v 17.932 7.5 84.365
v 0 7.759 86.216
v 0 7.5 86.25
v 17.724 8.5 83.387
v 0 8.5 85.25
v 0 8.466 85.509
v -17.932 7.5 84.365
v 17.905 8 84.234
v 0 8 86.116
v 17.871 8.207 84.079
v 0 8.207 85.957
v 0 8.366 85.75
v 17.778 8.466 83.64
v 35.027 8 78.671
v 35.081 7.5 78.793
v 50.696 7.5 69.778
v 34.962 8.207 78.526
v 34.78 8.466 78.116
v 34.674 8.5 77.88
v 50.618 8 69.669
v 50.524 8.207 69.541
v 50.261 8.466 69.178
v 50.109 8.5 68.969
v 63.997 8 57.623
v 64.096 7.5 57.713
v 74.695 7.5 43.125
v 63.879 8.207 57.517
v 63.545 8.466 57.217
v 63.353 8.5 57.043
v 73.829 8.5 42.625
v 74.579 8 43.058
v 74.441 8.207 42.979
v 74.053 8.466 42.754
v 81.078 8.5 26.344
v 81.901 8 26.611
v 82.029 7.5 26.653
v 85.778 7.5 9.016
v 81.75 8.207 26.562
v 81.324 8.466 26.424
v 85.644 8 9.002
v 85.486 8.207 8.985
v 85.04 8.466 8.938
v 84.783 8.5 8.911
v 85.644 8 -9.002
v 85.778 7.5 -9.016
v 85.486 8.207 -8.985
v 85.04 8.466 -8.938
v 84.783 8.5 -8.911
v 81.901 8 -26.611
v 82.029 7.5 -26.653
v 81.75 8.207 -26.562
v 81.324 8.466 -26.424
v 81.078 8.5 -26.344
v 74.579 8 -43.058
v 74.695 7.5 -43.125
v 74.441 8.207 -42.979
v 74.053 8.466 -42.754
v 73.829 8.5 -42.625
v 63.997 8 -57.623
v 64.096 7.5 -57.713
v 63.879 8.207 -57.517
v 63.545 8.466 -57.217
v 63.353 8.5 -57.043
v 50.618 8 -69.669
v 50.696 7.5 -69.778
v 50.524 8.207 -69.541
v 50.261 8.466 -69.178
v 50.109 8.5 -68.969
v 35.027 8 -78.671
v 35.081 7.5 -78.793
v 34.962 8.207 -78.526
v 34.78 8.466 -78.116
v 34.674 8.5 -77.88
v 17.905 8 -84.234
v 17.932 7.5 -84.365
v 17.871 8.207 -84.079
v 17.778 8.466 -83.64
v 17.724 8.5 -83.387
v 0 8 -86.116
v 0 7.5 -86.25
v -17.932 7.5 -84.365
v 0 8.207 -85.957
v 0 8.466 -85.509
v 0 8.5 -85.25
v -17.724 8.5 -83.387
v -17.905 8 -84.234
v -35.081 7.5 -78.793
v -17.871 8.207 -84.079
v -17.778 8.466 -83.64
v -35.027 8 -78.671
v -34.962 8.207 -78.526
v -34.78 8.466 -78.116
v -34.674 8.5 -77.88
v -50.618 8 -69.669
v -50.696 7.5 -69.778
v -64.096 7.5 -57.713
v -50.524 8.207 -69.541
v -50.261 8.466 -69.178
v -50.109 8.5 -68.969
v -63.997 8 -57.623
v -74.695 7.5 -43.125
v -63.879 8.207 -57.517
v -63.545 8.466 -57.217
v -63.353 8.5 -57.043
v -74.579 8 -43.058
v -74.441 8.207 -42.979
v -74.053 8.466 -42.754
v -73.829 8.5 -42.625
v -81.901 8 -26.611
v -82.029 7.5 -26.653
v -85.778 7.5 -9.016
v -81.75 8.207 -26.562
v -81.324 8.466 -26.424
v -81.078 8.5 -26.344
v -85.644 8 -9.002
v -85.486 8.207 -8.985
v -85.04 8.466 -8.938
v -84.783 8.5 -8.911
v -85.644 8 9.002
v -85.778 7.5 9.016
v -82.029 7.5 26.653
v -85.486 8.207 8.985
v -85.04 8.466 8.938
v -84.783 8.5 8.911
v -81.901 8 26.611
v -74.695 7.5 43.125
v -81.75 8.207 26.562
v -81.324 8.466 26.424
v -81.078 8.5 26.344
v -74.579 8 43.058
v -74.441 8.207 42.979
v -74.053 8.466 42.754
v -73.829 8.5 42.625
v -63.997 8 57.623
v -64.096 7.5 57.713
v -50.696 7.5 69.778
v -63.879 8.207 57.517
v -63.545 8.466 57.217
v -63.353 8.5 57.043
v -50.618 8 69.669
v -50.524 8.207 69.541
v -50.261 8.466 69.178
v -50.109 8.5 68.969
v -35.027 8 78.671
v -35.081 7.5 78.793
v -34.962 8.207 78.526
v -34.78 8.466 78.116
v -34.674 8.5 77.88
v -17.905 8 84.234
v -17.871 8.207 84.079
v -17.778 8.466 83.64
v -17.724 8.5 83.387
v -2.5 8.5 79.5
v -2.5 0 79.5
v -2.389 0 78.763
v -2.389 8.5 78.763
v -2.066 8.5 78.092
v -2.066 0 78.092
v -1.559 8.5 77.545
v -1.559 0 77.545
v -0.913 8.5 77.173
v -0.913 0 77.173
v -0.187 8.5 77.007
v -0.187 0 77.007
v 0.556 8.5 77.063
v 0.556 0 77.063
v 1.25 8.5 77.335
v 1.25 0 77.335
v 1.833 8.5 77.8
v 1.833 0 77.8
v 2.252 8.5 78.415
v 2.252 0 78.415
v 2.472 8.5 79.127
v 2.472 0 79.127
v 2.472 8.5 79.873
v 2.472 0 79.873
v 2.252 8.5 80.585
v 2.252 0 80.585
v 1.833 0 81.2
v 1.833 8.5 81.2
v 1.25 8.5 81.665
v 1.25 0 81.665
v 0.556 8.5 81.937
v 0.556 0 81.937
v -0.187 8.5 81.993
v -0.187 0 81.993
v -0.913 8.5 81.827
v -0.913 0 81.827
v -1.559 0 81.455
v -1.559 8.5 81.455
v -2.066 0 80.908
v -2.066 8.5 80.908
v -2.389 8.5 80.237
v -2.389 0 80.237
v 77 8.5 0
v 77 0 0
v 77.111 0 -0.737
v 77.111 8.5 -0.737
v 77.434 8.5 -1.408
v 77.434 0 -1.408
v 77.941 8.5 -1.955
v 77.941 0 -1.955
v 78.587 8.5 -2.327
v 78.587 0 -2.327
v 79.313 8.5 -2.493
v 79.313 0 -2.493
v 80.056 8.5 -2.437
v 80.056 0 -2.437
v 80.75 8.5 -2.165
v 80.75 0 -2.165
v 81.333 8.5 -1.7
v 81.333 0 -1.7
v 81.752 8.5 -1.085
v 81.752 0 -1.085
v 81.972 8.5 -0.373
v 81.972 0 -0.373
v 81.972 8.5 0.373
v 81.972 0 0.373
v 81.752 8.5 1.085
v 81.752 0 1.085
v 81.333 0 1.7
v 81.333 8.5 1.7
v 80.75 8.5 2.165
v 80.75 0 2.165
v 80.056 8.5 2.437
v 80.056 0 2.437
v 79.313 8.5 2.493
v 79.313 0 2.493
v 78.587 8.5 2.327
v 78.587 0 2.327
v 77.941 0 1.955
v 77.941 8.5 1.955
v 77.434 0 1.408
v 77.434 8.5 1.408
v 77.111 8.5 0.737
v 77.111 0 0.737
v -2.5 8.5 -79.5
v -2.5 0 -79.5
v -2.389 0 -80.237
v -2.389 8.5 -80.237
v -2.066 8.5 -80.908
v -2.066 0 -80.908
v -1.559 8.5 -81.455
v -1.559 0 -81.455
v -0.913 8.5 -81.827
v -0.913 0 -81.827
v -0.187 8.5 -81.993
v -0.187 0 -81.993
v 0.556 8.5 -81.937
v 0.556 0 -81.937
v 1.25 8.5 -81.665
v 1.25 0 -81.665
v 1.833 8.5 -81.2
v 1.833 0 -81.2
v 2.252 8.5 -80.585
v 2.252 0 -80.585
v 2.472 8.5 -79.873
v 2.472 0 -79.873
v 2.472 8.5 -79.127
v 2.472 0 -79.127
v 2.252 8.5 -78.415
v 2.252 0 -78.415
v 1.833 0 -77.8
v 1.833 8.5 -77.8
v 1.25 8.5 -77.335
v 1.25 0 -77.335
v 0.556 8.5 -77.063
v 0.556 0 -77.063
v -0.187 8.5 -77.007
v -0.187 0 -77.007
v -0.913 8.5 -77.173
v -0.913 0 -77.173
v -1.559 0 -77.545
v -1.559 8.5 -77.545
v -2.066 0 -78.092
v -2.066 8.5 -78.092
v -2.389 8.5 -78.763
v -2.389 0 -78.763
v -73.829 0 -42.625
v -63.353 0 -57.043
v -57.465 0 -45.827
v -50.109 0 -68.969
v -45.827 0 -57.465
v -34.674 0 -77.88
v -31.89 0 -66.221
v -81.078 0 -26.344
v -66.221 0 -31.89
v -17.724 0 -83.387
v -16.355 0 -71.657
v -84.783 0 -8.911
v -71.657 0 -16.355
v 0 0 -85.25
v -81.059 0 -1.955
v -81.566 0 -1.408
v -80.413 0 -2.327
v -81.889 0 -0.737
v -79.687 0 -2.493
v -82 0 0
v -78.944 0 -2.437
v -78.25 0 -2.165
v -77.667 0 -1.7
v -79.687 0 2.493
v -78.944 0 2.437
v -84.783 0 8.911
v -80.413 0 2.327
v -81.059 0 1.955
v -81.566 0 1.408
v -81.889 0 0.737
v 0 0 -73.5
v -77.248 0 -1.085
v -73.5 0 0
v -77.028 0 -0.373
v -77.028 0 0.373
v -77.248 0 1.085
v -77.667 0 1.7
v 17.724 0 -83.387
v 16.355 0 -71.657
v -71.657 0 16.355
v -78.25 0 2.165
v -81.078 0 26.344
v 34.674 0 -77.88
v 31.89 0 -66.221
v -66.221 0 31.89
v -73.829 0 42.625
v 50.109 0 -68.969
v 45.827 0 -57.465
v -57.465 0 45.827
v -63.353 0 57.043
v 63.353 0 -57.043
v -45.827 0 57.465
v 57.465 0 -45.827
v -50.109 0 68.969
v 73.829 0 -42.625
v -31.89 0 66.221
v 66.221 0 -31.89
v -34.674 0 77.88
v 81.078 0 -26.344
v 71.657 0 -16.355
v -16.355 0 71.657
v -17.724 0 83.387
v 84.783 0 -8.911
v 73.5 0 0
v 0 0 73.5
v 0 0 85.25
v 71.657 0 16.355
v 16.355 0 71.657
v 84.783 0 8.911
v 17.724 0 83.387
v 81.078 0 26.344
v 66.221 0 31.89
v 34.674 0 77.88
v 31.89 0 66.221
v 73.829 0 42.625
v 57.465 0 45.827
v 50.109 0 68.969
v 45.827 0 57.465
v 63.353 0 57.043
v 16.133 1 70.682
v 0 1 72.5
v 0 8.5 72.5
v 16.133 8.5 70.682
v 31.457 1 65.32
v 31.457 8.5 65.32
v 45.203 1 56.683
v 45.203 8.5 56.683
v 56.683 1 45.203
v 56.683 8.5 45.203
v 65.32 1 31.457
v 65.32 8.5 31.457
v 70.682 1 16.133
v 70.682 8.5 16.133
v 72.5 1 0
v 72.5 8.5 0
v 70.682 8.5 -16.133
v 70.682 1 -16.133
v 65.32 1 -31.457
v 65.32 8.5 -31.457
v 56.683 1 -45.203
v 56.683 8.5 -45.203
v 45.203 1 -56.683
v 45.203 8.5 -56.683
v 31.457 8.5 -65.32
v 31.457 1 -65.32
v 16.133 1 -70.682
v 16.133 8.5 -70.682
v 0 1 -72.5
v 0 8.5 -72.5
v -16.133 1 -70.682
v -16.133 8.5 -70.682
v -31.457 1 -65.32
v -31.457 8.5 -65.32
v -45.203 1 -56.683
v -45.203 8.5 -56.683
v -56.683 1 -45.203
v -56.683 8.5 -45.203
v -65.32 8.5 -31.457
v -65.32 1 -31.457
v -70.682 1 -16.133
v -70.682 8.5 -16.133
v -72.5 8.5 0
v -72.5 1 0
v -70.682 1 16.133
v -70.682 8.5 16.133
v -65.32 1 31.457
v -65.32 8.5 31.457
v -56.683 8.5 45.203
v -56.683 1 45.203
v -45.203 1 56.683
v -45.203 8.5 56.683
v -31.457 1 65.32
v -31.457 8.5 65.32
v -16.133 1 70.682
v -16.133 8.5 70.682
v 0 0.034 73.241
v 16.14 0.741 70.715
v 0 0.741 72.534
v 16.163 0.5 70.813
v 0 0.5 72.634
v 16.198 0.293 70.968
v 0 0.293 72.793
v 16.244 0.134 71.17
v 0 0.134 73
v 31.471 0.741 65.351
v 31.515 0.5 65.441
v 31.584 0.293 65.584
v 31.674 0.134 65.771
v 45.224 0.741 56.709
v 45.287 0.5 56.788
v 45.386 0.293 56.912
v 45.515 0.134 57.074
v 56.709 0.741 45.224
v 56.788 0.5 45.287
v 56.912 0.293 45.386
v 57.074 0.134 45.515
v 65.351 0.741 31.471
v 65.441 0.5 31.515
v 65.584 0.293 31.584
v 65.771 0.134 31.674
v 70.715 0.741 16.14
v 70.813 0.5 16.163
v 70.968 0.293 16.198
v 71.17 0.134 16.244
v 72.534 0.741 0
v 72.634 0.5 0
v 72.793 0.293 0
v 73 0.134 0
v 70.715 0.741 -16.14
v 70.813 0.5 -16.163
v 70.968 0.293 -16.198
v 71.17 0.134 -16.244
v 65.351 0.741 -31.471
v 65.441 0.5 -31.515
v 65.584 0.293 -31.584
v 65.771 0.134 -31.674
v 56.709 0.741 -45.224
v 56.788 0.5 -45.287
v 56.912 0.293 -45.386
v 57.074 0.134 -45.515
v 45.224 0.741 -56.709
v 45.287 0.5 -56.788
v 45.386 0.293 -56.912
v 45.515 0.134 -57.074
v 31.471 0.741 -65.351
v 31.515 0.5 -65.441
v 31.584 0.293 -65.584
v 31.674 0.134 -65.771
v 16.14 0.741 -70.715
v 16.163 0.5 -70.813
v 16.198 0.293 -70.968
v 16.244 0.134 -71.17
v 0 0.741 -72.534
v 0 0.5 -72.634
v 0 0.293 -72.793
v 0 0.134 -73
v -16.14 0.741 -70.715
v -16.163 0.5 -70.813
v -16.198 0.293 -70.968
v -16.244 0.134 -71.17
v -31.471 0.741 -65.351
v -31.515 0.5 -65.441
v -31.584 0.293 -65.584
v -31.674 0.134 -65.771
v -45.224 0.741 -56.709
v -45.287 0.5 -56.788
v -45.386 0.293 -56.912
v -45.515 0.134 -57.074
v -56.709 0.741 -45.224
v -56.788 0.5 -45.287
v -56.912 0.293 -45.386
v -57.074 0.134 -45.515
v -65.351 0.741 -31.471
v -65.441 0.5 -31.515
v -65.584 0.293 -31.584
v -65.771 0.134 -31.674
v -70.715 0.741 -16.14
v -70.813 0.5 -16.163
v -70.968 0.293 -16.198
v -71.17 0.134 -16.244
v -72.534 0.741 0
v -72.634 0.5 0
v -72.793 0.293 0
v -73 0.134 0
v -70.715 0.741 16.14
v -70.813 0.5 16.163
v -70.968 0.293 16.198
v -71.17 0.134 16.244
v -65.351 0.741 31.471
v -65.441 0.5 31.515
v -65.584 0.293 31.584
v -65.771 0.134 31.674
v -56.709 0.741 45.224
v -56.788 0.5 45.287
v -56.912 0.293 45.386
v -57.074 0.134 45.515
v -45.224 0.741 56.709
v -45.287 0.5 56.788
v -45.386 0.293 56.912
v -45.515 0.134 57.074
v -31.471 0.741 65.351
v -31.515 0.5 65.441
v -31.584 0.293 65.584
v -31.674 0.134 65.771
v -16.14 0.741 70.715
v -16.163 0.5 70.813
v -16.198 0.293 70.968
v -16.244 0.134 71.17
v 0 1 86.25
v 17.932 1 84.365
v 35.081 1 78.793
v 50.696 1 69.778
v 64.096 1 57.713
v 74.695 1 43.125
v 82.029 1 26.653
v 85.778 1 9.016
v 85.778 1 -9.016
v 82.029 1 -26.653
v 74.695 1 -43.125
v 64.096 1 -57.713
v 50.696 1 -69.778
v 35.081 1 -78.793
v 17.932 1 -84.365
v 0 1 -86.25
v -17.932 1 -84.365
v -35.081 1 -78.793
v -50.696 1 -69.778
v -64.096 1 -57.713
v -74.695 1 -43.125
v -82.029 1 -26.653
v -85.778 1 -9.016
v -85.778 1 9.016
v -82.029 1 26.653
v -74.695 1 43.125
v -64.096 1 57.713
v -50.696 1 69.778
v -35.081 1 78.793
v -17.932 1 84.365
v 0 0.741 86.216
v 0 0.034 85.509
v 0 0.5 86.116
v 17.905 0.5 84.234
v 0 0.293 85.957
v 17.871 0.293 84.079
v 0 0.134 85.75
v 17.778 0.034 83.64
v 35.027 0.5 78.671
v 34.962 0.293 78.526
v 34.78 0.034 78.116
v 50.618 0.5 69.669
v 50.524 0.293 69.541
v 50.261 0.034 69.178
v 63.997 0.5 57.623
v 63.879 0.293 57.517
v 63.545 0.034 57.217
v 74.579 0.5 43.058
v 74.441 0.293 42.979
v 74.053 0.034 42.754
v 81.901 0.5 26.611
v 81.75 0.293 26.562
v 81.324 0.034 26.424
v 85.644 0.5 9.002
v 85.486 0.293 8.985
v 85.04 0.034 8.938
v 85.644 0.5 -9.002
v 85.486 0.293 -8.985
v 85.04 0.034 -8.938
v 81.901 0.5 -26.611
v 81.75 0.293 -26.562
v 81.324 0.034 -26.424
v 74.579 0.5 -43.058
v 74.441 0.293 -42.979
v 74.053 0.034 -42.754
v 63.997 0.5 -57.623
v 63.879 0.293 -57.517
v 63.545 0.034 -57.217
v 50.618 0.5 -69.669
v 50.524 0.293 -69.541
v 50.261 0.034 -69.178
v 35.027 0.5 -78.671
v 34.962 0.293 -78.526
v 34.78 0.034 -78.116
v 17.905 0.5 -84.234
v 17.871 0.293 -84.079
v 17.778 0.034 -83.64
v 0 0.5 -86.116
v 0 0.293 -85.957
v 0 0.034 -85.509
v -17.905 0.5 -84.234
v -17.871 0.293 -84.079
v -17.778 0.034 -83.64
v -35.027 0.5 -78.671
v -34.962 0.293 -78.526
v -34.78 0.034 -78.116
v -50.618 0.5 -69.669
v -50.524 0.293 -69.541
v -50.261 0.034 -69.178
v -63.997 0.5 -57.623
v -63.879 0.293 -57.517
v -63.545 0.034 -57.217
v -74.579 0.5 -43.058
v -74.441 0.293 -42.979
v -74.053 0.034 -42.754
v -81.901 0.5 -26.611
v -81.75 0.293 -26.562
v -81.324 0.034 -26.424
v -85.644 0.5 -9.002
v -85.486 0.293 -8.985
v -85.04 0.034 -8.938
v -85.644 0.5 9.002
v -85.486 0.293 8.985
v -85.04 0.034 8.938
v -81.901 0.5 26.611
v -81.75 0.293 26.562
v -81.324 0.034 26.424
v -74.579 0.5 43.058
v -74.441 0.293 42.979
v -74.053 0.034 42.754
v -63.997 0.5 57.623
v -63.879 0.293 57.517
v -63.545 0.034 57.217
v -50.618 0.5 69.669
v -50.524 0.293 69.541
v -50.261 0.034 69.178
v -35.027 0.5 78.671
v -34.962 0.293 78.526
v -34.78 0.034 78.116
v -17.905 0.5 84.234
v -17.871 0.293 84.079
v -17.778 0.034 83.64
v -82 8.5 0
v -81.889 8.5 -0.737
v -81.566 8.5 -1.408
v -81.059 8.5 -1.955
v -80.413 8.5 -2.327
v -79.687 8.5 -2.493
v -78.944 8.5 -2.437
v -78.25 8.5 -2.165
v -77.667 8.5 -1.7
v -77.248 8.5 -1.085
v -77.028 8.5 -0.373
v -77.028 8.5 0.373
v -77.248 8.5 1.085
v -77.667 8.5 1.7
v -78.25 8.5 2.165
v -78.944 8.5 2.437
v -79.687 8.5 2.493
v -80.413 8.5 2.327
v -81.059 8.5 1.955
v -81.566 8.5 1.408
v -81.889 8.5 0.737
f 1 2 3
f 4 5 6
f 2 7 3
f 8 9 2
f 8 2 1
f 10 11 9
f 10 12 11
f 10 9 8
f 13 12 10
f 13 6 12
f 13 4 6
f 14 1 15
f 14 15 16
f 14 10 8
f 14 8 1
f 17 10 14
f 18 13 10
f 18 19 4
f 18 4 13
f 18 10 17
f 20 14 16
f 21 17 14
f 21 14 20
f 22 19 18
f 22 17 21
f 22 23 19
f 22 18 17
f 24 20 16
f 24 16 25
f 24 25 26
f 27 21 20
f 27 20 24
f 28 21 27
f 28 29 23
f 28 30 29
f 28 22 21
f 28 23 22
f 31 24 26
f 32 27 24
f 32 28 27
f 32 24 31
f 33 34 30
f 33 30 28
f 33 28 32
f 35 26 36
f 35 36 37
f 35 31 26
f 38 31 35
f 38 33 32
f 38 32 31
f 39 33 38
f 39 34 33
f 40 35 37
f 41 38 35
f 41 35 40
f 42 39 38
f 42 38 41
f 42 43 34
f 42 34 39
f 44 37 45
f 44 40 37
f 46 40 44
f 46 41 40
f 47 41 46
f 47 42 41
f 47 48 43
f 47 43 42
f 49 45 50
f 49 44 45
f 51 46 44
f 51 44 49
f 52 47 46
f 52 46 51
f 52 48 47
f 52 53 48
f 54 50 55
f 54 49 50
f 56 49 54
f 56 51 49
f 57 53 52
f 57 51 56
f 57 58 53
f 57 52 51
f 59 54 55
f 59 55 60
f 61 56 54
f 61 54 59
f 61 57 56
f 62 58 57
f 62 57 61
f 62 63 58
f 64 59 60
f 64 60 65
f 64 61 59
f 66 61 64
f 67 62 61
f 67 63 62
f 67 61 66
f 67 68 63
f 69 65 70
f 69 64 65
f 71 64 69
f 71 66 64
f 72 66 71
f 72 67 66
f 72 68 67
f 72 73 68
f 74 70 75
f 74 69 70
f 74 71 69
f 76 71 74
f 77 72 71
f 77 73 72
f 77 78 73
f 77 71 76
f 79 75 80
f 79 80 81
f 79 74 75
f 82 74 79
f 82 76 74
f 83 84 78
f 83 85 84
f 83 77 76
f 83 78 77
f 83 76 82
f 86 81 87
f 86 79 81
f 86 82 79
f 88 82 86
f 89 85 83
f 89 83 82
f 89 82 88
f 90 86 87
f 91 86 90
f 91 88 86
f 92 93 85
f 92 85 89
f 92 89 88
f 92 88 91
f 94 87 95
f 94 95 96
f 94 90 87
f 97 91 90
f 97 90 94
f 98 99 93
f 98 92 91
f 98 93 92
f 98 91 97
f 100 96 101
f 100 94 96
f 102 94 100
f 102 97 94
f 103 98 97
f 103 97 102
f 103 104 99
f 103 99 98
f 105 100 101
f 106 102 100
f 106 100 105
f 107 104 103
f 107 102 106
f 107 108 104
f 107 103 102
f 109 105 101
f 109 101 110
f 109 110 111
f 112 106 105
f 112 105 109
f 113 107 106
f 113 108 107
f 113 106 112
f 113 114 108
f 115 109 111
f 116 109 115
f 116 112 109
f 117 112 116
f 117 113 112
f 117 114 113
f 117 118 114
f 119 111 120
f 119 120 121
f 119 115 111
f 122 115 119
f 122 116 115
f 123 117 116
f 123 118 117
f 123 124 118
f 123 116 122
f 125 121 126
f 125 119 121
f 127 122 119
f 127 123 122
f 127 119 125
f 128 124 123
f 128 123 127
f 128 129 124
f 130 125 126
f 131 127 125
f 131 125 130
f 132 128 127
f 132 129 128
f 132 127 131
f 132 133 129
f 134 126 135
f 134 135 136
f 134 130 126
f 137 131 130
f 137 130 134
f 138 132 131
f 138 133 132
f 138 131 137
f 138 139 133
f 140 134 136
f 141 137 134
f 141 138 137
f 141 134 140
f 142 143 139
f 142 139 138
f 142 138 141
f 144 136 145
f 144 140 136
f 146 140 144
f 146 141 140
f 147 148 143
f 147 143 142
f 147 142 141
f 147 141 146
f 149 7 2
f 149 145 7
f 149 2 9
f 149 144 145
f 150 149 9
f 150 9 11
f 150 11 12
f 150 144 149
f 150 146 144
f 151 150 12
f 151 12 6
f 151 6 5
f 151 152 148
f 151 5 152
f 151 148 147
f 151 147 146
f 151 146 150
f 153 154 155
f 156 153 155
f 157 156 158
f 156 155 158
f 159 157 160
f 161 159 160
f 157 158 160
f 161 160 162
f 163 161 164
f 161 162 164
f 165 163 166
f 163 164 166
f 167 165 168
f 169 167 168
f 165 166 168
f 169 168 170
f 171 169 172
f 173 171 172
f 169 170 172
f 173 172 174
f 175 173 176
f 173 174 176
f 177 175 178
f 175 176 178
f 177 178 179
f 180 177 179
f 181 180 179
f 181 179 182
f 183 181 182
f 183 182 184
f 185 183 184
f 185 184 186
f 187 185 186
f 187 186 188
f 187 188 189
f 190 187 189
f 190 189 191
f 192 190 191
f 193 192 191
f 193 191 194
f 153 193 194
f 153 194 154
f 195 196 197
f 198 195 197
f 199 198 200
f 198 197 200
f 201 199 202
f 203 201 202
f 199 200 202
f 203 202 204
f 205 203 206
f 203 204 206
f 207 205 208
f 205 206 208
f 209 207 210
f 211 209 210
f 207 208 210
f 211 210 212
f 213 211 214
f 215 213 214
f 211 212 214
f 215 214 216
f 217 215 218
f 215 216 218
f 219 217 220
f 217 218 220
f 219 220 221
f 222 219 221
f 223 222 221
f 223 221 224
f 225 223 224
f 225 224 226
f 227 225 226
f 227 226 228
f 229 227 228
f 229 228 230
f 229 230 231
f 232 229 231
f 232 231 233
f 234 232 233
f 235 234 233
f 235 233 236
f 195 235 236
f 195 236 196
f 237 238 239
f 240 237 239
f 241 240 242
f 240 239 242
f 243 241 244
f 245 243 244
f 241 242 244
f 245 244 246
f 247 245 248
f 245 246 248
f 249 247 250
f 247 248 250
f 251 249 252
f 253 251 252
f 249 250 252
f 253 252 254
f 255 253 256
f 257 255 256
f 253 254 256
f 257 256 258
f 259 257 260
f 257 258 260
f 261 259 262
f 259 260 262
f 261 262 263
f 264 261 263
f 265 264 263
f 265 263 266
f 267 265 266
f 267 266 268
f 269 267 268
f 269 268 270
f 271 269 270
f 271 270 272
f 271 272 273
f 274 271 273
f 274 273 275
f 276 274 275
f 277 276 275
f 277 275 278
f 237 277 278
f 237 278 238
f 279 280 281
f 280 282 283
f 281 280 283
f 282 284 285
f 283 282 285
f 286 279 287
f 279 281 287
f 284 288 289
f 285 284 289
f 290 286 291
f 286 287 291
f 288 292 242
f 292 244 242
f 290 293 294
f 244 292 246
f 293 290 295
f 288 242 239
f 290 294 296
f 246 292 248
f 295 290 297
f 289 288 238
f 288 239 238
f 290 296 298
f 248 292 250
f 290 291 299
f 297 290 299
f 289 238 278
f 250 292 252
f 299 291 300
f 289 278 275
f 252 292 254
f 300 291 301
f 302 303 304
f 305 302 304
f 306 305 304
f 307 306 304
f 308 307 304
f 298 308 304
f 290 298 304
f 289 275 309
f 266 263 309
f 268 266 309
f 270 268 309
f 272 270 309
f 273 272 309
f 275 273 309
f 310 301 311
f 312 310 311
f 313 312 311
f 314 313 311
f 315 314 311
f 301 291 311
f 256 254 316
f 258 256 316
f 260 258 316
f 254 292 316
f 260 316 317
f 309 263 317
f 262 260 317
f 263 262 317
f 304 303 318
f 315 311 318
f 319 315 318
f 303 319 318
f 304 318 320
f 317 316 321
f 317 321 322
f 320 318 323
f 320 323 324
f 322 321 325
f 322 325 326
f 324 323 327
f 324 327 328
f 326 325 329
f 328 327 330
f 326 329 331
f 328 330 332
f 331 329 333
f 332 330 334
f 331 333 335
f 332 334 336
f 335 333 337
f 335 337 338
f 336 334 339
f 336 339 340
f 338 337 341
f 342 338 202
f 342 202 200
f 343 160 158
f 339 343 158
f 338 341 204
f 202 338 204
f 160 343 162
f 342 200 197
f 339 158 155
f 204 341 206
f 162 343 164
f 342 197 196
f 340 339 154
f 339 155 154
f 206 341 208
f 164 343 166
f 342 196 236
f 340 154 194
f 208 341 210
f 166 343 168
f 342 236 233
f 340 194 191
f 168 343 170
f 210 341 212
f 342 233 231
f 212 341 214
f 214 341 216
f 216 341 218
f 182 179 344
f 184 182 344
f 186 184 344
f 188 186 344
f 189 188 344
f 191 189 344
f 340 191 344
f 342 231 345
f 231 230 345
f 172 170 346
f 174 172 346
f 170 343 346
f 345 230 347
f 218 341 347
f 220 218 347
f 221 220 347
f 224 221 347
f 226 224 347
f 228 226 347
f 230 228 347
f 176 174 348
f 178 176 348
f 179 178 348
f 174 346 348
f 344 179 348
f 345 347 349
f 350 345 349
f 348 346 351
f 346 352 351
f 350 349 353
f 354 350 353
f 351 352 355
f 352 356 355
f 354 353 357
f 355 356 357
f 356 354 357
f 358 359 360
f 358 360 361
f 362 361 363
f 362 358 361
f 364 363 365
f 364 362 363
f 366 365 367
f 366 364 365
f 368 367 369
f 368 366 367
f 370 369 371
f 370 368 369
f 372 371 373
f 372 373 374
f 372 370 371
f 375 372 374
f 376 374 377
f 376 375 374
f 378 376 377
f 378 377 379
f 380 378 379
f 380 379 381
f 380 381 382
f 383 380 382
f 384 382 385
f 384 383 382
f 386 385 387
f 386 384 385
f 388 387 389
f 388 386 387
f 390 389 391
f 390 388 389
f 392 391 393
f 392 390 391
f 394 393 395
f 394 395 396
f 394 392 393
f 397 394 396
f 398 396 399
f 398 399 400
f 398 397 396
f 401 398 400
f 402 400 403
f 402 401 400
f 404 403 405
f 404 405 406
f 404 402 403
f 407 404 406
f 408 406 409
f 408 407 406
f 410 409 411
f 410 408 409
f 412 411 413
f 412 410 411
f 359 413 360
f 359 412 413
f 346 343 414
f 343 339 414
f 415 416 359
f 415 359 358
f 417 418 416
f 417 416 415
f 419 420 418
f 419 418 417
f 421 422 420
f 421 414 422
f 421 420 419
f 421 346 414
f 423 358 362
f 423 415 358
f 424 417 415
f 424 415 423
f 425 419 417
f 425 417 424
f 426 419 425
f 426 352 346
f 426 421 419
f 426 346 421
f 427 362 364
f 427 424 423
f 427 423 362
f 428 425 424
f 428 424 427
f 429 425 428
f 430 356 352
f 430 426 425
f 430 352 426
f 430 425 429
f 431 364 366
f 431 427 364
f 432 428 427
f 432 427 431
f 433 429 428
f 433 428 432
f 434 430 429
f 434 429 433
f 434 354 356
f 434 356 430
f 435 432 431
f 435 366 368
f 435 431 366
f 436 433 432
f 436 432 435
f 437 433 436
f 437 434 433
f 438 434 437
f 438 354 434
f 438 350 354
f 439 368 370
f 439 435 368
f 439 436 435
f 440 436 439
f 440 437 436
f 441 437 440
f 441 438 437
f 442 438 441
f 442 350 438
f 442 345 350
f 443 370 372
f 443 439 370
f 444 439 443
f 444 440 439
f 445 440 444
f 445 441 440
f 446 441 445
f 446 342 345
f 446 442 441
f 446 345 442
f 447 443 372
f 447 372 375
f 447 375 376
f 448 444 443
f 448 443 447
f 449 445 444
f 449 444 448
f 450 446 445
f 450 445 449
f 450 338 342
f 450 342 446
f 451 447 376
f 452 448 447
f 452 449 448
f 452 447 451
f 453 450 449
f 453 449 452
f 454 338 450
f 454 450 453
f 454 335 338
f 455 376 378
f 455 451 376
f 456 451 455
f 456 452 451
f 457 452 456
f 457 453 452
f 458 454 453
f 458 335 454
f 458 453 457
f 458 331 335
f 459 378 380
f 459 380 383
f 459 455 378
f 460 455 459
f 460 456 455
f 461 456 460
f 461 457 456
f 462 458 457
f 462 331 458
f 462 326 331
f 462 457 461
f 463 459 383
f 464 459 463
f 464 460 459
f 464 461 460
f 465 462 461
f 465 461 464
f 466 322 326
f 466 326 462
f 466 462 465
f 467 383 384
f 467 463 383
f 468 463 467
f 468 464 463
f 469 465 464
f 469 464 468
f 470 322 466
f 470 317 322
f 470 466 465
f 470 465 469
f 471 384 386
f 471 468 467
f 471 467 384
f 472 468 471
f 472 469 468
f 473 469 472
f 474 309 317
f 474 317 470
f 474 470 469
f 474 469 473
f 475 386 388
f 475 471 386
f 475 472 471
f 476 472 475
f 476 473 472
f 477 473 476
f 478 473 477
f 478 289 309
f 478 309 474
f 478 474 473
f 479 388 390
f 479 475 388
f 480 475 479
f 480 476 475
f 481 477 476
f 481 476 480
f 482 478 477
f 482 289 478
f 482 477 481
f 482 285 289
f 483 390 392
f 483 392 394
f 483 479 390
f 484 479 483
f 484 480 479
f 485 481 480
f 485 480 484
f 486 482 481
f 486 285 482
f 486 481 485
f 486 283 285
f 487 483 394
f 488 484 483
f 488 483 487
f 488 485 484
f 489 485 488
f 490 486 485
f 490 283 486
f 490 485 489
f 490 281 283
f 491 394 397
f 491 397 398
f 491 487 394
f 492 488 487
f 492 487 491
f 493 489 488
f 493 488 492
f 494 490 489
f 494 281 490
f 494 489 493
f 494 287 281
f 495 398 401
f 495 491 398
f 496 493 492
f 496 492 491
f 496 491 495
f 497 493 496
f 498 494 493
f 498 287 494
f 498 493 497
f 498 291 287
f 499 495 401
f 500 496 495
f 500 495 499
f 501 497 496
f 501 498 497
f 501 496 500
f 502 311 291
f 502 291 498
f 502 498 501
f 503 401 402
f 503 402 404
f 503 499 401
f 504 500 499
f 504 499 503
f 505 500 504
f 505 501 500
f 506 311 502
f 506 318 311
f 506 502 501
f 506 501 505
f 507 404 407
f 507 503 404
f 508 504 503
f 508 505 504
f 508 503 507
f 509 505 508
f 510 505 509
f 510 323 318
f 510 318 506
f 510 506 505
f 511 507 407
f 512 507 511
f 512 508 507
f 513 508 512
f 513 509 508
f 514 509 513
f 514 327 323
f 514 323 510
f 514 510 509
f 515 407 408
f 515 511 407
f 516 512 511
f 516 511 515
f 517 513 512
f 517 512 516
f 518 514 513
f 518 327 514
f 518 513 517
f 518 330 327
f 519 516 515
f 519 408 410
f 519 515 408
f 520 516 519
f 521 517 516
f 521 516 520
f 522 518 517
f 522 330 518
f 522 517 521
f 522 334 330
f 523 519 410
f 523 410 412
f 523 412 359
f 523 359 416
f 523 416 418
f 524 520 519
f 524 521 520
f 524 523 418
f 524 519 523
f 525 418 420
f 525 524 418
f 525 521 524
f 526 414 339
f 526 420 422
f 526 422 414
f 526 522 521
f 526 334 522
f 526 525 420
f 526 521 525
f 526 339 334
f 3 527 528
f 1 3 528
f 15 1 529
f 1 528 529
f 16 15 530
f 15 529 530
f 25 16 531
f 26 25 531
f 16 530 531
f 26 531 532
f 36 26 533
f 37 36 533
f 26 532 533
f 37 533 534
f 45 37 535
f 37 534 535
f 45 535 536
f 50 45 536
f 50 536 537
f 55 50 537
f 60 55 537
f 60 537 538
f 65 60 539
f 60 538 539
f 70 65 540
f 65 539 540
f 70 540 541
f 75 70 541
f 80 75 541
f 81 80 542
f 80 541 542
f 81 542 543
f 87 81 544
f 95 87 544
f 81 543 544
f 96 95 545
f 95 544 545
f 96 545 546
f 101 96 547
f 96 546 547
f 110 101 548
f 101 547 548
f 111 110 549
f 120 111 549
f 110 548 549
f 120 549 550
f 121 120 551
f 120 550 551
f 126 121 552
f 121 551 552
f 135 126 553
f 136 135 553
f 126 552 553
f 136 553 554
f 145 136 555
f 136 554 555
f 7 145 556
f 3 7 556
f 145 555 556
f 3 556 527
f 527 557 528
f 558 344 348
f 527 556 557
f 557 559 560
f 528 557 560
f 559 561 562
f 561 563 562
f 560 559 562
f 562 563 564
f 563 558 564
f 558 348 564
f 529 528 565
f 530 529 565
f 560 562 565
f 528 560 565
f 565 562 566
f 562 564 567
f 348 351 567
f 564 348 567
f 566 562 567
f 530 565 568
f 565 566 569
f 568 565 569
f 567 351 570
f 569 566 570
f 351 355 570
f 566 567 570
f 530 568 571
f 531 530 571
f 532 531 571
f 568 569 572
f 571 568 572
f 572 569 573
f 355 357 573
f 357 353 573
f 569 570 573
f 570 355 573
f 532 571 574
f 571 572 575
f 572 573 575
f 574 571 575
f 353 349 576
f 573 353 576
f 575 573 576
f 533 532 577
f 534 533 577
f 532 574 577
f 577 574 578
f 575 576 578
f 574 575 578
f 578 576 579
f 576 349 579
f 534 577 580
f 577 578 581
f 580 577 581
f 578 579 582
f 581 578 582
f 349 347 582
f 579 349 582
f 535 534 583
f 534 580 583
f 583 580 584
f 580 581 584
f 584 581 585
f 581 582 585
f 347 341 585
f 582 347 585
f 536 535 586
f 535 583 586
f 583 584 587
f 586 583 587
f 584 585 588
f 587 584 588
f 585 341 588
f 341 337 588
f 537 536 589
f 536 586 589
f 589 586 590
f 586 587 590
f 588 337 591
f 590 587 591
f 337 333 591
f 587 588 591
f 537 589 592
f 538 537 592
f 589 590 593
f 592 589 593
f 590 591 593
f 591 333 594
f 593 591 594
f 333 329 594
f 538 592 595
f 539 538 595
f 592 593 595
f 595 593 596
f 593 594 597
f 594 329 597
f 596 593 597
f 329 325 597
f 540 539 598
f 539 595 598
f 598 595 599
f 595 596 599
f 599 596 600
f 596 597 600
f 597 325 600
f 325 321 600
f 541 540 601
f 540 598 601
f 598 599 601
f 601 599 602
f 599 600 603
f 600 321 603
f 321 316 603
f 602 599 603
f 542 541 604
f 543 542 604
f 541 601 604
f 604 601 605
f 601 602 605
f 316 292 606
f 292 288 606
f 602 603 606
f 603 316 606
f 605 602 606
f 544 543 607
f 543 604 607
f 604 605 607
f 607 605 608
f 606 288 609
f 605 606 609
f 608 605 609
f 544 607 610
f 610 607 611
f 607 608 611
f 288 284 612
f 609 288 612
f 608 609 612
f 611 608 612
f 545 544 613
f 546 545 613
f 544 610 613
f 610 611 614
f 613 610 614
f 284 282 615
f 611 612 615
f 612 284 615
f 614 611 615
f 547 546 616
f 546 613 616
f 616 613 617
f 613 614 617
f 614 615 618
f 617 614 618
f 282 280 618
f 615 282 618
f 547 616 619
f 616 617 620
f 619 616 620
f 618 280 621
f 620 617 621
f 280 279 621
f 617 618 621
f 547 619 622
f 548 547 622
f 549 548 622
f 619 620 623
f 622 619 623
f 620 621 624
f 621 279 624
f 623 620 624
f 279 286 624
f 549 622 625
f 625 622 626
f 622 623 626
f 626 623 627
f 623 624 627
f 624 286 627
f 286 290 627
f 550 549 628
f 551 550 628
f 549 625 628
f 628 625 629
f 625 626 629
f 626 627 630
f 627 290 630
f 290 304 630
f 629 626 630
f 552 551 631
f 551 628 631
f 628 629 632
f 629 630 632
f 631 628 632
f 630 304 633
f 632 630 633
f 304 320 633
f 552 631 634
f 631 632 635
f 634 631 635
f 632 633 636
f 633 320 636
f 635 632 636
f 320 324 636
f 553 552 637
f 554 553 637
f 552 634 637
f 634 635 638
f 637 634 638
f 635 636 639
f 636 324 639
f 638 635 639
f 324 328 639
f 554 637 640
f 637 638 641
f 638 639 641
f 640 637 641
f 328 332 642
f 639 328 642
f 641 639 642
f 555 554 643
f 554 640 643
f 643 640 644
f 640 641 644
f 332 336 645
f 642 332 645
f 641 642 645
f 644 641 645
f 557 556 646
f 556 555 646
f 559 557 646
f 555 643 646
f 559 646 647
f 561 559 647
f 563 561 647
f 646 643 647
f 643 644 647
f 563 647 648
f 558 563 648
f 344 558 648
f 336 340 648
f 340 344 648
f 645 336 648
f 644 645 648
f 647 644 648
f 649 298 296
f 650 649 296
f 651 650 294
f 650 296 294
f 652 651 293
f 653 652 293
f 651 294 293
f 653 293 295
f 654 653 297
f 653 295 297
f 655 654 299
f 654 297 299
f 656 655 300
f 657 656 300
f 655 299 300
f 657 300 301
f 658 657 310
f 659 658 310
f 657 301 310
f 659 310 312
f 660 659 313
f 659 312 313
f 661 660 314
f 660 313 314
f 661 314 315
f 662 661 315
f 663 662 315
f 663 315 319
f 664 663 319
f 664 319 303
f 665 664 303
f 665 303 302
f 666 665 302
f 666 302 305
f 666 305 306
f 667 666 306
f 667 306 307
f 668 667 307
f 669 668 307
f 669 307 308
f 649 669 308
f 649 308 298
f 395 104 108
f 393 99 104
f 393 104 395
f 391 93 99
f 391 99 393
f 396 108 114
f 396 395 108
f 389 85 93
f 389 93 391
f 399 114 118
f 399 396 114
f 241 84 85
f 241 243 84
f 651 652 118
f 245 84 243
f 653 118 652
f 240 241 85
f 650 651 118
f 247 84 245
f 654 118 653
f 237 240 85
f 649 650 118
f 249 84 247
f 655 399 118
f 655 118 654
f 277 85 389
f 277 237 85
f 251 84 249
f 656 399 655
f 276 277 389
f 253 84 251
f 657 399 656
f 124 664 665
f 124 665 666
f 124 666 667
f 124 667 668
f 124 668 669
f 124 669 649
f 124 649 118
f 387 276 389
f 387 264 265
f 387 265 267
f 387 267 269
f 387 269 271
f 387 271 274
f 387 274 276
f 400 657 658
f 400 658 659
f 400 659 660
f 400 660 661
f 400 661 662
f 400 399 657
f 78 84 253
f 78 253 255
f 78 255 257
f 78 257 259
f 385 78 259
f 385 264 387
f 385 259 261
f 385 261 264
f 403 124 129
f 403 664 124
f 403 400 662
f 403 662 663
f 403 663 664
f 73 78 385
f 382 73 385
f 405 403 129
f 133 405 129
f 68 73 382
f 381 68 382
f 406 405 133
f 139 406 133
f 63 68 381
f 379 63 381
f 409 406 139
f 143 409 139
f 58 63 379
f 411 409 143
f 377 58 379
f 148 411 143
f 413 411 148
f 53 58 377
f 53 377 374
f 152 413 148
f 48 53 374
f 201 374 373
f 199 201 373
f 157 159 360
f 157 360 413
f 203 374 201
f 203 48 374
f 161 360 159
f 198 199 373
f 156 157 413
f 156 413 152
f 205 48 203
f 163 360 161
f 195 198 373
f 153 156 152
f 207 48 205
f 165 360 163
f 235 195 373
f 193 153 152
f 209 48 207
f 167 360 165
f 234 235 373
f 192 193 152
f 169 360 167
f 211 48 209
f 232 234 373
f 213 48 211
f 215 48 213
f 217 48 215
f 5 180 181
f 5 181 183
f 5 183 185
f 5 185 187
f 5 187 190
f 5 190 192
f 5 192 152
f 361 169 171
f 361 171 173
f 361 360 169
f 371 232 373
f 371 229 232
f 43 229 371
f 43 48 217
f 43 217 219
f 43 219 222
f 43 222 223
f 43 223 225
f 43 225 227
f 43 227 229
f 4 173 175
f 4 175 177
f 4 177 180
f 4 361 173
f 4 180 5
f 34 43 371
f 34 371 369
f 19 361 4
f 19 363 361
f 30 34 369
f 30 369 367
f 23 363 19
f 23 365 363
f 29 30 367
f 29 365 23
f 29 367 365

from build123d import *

# Parameters (mm, degrees)
SKETCH1_R           = 86.25
SKETCH1_R_2         = 72.5
BOSS_EXTRUDE1_DEPTH = 8.5
FILLET1_R           = 1
M6_TAPPED_HOLE1_D   = 5


with BuildPart() as part:
    # Sketch1 → Boss-Extrude1 (new body)
    with BuildSketch(Plane(origin=(0, 0, 0), x_dir=(1, 0, 0), z_dir=(0, 1, 0))):
        with Locations(Location((0, 0, 0), (0, 0, 270))):
            Circle(SKETCH1_R)
        with Locations(Location((0, 0, 0), (0, 0, 270))):
            Circle(SKETCH1_R_2, mode=Mode.SUBTRACT)
    extrude(amount=BOSS_EXTRUDE1_DEPTH)

    # Fillet1
    fillet1_edges = [part.edges().sort_by_distance(p)[0] for p in [
        (0, 0, -86.25),
        (0, 8.5, -86.25),
        (0, 0, -72.5),
    ]]
    fillet(fillet1_edges, radius=FILLET1_R)

    # M6 Tapped Hole1 (through all)
    with Locations(Plane(origin=(0, 8.5, 0), x_dir=(1, 0, 0), z_dir=(0, 1, 0))):
        with Locations((0, 79.5), (79.5, 0), (0, -79.5), (-79.5, 0)):
            Hole(M6_TAPPED_HOLE1_D / 2)


solid = part.part
